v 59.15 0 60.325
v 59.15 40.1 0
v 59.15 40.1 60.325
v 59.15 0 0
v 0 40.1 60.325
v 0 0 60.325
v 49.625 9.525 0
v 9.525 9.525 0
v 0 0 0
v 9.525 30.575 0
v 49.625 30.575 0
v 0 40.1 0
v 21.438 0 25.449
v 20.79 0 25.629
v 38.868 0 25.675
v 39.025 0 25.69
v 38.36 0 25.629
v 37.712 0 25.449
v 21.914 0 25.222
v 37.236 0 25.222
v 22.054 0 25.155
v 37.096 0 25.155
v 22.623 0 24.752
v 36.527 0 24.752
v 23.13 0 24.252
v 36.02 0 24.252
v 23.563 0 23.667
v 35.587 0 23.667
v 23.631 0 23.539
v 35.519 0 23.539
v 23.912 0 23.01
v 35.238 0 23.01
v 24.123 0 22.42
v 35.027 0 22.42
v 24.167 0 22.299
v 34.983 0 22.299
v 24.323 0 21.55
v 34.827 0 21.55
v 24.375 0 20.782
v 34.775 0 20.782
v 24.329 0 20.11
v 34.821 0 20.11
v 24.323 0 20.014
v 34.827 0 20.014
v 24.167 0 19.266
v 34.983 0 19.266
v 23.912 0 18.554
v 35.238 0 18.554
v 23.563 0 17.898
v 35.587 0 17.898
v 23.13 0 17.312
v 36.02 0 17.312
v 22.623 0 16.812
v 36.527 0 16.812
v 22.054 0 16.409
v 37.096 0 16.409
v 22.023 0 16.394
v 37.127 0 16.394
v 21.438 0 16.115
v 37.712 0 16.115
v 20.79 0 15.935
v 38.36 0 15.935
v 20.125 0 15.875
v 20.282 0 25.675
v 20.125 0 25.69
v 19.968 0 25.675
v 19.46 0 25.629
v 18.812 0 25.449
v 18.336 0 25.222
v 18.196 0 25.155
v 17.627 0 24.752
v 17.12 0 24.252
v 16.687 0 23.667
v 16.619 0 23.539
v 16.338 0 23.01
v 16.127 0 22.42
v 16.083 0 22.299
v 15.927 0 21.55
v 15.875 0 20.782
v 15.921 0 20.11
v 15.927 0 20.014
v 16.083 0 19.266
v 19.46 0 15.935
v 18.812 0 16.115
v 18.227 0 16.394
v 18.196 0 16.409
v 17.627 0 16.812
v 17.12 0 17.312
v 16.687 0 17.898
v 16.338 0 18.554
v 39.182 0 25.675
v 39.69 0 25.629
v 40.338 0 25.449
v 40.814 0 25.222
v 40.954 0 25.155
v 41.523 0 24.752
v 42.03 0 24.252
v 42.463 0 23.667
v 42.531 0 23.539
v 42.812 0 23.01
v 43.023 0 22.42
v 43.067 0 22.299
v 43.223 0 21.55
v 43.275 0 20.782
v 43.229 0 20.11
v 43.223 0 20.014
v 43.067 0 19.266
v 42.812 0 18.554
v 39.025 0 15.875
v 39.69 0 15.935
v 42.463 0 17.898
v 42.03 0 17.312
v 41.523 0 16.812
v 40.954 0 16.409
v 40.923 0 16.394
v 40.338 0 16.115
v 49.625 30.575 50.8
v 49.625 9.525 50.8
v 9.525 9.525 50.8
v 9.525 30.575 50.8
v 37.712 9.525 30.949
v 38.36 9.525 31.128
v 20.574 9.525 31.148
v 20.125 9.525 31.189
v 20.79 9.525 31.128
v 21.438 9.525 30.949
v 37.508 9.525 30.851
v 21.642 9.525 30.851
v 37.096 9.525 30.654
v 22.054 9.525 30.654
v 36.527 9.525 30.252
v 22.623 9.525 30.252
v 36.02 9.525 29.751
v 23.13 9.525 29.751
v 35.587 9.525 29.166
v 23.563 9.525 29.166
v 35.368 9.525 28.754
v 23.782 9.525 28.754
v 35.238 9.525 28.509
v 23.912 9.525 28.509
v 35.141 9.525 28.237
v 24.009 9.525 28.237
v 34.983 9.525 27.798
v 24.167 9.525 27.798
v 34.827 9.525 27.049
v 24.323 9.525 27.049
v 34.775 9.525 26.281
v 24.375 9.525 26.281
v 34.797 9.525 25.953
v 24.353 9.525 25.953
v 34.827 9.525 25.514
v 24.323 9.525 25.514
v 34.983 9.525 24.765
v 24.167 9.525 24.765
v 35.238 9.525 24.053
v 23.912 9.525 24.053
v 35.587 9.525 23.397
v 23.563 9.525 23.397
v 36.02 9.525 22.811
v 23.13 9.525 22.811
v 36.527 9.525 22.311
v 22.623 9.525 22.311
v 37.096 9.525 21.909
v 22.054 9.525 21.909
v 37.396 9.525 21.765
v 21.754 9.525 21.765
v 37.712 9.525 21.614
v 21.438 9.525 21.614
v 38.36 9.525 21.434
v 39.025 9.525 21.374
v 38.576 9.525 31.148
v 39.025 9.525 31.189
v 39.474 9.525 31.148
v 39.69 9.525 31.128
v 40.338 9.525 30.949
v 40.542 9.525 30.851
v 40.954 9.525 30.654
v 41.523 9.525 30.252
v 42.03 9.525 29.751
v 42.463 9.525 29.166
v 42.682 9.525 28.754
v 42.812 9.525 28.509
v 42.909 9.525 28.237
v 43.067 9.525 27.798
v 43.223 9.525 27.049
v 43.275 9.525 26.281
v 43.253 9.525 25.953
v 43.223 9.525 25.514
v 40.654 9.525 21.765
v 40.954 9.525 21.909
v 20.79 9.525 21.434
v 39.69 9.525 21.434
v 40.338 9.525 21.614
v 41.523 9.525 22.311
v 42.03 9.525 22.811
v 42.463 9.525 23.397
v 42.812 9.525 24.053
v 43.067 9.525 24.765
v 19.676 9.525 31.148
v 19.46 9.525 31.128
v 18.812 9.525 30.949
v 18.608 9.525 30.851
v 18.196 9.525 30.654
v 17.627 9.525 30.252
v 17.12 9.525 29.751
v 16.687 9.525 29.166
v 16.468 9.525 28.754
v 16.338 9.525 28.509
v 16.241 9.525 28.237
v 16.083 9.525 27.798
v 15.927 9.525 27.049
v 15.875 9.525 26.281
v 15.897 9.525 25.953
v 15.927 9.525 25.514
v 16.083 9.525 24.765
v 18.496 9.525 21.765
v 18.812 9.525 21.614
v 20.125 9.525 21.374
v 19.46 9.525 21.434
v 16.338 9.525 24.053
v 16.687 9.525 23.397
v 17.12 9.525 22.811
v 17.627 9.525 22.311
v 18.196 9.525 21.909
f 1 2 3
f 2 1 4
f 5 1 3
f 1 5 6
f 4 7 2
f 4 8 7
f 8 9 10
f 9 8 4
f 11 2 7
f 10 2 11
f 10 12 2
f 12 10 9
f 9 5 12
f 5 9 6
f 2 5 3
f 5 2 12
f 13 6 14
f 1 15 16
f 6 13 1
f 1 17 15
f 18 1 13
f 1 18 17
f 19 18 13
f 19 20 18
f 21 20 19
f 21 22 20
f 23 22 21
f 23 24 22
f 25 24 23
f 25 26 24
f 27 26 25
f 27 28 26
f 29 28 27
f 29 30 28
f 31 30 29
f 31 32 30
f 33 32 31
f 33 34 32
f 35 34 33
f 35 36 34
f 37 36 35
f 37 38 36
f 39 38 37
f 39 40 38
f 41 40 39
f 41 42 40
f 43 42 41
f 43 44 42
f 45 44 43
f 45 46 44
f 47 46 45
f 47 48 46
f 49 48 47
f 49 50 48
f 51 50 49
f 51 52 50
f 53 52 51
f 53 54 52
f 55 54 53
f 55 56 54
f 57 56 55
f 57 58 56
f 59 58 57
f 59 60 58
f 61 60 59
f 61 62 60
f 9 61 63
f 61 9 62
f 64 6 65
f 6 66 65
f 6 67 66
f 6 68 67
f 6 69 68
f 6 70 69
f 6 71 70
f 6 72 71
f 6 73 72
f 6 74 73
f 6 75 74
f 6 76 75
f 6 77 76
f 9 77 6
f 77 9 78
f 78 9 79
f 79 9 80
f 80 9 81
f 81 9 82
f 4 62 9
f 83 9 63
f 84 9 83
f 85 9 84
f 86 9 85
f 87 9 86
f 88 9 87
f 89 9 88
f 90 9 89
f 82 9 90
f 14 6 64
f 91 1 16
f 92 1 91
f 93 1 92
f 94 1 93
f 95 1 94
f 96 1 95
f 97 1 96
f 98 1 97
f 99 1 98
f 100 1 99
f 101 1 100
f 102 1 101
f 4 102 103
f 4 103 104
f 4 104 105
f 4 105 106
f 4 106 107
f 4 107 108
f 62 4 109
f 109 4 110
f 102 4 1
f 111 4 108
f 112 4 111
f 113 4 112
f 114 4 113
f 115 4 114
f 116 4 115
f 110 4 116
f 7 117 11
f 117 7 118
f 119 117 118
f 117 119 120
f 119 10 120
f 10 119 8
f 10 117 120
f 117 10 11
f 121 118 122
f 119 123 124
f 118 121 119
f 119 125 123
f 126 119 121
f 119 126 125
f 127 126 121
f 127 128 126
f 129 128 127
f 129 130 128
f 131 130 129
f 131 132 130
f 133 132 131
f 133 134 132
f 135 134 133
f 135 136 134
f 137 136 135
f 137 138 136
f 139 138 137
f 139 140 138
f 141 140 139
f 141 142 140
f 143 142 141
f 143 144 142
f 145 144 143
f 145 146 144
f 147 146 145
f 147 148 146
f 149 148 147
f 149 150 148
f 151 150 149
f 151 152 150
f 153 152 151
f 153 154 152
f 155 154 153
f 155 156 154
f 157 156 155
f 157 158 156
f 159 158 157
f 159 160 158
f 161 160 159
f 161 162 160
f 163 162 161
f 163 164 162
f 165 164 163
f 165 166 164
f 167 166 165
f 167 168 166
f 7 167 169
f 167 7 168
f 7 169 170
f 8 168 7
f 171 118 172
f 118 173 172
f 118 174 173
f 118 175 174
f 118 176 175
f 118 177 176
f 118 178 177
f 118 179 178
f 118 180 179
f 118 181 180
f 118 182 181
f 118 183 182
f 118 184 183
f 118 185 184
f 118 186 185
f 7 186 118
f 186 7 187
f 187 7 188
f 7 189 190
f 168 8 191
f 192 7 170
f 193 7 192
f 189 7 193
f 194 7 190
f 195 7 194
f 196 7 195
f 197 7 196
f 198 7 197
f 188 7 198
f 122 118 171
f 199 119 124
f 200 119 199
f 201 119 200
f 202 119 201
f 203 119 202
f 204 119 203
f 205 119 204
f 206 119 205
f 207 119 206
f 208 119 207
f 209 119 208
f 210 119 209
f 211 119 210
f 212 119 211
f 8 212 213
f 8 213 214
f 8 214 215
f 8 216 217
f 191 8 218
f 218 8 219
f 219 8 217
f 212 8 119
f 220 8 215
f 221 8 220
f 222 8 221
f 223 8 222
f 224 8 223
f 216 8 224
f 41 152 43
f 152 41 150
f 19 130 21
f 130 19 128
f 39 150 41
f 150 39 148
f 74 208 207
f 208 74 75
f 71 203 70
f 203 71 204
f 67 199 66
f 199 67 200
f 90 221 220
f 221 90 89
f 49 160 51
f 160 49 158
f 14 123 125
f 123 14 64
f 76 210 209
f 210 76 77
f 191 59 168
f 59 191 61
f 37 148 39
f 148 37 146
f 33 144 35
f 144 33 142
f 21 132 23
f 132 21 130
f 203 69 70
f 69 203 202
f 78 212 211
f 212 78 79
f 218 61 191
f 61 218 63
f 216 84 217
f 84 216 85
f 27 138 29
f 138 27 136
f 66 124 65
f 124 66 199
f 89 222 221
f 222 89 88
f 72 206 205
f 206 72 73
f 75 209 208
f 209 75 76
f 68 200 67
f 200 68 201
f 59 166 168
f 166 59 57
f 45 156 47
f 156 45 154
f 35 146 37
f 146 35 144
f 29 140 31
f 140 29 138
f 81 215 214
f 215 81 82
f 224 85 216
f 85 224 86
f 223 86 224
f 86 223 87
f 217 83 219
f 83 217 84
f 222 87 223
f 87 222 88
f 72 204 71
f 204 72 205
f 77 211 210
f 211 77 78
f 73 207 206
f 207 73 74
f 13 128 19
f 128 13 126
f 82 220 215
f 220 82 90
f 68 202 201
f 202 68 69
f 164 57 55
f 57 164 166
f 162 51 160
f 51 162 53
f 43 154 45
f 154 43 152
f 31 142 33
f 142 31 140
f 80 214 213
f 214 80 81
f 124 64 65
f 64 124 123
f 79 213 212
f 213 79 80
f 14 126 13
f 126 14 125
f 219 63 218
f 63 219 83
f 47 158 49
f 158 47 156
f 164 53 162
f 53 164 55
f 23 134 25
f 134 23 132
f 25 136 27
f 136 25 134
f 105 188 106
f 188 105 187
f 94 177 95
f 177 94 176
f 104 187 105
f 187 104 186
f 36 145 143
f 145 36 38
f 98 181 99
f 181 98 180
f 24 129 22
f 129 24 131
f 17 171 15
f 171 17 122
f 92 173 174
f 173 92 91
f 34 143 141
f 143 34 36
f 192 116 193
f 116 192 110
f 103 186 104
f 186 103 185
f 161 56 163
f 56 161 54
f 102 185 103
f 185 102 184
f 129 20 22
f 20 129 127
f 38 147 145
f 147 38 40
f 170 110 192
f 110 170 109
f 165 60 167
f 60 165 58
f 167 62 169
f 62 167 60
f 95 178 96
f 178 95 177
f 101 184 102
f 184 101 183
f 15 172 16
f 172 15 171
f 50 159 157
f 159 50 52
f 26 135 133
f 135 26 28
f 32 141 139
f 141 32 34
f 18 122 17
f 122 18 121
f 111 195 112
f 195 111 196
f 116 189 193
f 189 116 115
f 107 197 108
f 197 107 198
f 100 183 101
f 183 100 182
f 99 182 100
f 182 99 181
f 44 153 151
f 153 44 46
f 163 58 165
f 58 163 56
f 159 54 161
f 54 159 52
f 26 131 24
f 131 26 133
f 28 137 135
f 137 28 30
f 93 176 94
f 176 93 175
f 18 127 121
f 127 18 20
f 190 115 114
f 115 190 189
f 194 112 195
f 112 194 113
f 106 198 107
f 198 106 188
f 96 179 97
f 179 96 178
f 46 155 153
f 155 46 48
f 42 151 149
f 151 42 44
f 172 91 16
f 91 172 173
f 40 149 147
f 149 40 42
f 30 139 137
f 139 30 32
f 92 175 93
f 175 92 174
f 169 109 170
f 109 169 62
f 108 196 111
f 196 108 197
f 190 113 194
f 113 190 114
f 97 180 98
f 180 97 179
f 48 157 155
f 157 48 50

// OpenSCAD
$fn = 40;
length = 50.8;

wall = 9.525;
slop = 2;

width =  38.1 + slop;
height = 19.05 + slop;

shankdiameter = 8.5;
spacing = 6.35;

difference(){
    cube([width+wall*2,height+wall*2,length+wall],0);
    translate([wall,wall,0])cube([width,height,length],0);
    translate([wall+shankdiameter/2+spacing,-3,length-31.75])rotate([-60,0,0])cylinder(d=shankdiameter, 25);
    translate([width+wall*2-(wall+shankdiameter/2+spacing),-3,length-31.75])rotate([-60,0,0])cylinder(d=shankdiameter, 25);
}
